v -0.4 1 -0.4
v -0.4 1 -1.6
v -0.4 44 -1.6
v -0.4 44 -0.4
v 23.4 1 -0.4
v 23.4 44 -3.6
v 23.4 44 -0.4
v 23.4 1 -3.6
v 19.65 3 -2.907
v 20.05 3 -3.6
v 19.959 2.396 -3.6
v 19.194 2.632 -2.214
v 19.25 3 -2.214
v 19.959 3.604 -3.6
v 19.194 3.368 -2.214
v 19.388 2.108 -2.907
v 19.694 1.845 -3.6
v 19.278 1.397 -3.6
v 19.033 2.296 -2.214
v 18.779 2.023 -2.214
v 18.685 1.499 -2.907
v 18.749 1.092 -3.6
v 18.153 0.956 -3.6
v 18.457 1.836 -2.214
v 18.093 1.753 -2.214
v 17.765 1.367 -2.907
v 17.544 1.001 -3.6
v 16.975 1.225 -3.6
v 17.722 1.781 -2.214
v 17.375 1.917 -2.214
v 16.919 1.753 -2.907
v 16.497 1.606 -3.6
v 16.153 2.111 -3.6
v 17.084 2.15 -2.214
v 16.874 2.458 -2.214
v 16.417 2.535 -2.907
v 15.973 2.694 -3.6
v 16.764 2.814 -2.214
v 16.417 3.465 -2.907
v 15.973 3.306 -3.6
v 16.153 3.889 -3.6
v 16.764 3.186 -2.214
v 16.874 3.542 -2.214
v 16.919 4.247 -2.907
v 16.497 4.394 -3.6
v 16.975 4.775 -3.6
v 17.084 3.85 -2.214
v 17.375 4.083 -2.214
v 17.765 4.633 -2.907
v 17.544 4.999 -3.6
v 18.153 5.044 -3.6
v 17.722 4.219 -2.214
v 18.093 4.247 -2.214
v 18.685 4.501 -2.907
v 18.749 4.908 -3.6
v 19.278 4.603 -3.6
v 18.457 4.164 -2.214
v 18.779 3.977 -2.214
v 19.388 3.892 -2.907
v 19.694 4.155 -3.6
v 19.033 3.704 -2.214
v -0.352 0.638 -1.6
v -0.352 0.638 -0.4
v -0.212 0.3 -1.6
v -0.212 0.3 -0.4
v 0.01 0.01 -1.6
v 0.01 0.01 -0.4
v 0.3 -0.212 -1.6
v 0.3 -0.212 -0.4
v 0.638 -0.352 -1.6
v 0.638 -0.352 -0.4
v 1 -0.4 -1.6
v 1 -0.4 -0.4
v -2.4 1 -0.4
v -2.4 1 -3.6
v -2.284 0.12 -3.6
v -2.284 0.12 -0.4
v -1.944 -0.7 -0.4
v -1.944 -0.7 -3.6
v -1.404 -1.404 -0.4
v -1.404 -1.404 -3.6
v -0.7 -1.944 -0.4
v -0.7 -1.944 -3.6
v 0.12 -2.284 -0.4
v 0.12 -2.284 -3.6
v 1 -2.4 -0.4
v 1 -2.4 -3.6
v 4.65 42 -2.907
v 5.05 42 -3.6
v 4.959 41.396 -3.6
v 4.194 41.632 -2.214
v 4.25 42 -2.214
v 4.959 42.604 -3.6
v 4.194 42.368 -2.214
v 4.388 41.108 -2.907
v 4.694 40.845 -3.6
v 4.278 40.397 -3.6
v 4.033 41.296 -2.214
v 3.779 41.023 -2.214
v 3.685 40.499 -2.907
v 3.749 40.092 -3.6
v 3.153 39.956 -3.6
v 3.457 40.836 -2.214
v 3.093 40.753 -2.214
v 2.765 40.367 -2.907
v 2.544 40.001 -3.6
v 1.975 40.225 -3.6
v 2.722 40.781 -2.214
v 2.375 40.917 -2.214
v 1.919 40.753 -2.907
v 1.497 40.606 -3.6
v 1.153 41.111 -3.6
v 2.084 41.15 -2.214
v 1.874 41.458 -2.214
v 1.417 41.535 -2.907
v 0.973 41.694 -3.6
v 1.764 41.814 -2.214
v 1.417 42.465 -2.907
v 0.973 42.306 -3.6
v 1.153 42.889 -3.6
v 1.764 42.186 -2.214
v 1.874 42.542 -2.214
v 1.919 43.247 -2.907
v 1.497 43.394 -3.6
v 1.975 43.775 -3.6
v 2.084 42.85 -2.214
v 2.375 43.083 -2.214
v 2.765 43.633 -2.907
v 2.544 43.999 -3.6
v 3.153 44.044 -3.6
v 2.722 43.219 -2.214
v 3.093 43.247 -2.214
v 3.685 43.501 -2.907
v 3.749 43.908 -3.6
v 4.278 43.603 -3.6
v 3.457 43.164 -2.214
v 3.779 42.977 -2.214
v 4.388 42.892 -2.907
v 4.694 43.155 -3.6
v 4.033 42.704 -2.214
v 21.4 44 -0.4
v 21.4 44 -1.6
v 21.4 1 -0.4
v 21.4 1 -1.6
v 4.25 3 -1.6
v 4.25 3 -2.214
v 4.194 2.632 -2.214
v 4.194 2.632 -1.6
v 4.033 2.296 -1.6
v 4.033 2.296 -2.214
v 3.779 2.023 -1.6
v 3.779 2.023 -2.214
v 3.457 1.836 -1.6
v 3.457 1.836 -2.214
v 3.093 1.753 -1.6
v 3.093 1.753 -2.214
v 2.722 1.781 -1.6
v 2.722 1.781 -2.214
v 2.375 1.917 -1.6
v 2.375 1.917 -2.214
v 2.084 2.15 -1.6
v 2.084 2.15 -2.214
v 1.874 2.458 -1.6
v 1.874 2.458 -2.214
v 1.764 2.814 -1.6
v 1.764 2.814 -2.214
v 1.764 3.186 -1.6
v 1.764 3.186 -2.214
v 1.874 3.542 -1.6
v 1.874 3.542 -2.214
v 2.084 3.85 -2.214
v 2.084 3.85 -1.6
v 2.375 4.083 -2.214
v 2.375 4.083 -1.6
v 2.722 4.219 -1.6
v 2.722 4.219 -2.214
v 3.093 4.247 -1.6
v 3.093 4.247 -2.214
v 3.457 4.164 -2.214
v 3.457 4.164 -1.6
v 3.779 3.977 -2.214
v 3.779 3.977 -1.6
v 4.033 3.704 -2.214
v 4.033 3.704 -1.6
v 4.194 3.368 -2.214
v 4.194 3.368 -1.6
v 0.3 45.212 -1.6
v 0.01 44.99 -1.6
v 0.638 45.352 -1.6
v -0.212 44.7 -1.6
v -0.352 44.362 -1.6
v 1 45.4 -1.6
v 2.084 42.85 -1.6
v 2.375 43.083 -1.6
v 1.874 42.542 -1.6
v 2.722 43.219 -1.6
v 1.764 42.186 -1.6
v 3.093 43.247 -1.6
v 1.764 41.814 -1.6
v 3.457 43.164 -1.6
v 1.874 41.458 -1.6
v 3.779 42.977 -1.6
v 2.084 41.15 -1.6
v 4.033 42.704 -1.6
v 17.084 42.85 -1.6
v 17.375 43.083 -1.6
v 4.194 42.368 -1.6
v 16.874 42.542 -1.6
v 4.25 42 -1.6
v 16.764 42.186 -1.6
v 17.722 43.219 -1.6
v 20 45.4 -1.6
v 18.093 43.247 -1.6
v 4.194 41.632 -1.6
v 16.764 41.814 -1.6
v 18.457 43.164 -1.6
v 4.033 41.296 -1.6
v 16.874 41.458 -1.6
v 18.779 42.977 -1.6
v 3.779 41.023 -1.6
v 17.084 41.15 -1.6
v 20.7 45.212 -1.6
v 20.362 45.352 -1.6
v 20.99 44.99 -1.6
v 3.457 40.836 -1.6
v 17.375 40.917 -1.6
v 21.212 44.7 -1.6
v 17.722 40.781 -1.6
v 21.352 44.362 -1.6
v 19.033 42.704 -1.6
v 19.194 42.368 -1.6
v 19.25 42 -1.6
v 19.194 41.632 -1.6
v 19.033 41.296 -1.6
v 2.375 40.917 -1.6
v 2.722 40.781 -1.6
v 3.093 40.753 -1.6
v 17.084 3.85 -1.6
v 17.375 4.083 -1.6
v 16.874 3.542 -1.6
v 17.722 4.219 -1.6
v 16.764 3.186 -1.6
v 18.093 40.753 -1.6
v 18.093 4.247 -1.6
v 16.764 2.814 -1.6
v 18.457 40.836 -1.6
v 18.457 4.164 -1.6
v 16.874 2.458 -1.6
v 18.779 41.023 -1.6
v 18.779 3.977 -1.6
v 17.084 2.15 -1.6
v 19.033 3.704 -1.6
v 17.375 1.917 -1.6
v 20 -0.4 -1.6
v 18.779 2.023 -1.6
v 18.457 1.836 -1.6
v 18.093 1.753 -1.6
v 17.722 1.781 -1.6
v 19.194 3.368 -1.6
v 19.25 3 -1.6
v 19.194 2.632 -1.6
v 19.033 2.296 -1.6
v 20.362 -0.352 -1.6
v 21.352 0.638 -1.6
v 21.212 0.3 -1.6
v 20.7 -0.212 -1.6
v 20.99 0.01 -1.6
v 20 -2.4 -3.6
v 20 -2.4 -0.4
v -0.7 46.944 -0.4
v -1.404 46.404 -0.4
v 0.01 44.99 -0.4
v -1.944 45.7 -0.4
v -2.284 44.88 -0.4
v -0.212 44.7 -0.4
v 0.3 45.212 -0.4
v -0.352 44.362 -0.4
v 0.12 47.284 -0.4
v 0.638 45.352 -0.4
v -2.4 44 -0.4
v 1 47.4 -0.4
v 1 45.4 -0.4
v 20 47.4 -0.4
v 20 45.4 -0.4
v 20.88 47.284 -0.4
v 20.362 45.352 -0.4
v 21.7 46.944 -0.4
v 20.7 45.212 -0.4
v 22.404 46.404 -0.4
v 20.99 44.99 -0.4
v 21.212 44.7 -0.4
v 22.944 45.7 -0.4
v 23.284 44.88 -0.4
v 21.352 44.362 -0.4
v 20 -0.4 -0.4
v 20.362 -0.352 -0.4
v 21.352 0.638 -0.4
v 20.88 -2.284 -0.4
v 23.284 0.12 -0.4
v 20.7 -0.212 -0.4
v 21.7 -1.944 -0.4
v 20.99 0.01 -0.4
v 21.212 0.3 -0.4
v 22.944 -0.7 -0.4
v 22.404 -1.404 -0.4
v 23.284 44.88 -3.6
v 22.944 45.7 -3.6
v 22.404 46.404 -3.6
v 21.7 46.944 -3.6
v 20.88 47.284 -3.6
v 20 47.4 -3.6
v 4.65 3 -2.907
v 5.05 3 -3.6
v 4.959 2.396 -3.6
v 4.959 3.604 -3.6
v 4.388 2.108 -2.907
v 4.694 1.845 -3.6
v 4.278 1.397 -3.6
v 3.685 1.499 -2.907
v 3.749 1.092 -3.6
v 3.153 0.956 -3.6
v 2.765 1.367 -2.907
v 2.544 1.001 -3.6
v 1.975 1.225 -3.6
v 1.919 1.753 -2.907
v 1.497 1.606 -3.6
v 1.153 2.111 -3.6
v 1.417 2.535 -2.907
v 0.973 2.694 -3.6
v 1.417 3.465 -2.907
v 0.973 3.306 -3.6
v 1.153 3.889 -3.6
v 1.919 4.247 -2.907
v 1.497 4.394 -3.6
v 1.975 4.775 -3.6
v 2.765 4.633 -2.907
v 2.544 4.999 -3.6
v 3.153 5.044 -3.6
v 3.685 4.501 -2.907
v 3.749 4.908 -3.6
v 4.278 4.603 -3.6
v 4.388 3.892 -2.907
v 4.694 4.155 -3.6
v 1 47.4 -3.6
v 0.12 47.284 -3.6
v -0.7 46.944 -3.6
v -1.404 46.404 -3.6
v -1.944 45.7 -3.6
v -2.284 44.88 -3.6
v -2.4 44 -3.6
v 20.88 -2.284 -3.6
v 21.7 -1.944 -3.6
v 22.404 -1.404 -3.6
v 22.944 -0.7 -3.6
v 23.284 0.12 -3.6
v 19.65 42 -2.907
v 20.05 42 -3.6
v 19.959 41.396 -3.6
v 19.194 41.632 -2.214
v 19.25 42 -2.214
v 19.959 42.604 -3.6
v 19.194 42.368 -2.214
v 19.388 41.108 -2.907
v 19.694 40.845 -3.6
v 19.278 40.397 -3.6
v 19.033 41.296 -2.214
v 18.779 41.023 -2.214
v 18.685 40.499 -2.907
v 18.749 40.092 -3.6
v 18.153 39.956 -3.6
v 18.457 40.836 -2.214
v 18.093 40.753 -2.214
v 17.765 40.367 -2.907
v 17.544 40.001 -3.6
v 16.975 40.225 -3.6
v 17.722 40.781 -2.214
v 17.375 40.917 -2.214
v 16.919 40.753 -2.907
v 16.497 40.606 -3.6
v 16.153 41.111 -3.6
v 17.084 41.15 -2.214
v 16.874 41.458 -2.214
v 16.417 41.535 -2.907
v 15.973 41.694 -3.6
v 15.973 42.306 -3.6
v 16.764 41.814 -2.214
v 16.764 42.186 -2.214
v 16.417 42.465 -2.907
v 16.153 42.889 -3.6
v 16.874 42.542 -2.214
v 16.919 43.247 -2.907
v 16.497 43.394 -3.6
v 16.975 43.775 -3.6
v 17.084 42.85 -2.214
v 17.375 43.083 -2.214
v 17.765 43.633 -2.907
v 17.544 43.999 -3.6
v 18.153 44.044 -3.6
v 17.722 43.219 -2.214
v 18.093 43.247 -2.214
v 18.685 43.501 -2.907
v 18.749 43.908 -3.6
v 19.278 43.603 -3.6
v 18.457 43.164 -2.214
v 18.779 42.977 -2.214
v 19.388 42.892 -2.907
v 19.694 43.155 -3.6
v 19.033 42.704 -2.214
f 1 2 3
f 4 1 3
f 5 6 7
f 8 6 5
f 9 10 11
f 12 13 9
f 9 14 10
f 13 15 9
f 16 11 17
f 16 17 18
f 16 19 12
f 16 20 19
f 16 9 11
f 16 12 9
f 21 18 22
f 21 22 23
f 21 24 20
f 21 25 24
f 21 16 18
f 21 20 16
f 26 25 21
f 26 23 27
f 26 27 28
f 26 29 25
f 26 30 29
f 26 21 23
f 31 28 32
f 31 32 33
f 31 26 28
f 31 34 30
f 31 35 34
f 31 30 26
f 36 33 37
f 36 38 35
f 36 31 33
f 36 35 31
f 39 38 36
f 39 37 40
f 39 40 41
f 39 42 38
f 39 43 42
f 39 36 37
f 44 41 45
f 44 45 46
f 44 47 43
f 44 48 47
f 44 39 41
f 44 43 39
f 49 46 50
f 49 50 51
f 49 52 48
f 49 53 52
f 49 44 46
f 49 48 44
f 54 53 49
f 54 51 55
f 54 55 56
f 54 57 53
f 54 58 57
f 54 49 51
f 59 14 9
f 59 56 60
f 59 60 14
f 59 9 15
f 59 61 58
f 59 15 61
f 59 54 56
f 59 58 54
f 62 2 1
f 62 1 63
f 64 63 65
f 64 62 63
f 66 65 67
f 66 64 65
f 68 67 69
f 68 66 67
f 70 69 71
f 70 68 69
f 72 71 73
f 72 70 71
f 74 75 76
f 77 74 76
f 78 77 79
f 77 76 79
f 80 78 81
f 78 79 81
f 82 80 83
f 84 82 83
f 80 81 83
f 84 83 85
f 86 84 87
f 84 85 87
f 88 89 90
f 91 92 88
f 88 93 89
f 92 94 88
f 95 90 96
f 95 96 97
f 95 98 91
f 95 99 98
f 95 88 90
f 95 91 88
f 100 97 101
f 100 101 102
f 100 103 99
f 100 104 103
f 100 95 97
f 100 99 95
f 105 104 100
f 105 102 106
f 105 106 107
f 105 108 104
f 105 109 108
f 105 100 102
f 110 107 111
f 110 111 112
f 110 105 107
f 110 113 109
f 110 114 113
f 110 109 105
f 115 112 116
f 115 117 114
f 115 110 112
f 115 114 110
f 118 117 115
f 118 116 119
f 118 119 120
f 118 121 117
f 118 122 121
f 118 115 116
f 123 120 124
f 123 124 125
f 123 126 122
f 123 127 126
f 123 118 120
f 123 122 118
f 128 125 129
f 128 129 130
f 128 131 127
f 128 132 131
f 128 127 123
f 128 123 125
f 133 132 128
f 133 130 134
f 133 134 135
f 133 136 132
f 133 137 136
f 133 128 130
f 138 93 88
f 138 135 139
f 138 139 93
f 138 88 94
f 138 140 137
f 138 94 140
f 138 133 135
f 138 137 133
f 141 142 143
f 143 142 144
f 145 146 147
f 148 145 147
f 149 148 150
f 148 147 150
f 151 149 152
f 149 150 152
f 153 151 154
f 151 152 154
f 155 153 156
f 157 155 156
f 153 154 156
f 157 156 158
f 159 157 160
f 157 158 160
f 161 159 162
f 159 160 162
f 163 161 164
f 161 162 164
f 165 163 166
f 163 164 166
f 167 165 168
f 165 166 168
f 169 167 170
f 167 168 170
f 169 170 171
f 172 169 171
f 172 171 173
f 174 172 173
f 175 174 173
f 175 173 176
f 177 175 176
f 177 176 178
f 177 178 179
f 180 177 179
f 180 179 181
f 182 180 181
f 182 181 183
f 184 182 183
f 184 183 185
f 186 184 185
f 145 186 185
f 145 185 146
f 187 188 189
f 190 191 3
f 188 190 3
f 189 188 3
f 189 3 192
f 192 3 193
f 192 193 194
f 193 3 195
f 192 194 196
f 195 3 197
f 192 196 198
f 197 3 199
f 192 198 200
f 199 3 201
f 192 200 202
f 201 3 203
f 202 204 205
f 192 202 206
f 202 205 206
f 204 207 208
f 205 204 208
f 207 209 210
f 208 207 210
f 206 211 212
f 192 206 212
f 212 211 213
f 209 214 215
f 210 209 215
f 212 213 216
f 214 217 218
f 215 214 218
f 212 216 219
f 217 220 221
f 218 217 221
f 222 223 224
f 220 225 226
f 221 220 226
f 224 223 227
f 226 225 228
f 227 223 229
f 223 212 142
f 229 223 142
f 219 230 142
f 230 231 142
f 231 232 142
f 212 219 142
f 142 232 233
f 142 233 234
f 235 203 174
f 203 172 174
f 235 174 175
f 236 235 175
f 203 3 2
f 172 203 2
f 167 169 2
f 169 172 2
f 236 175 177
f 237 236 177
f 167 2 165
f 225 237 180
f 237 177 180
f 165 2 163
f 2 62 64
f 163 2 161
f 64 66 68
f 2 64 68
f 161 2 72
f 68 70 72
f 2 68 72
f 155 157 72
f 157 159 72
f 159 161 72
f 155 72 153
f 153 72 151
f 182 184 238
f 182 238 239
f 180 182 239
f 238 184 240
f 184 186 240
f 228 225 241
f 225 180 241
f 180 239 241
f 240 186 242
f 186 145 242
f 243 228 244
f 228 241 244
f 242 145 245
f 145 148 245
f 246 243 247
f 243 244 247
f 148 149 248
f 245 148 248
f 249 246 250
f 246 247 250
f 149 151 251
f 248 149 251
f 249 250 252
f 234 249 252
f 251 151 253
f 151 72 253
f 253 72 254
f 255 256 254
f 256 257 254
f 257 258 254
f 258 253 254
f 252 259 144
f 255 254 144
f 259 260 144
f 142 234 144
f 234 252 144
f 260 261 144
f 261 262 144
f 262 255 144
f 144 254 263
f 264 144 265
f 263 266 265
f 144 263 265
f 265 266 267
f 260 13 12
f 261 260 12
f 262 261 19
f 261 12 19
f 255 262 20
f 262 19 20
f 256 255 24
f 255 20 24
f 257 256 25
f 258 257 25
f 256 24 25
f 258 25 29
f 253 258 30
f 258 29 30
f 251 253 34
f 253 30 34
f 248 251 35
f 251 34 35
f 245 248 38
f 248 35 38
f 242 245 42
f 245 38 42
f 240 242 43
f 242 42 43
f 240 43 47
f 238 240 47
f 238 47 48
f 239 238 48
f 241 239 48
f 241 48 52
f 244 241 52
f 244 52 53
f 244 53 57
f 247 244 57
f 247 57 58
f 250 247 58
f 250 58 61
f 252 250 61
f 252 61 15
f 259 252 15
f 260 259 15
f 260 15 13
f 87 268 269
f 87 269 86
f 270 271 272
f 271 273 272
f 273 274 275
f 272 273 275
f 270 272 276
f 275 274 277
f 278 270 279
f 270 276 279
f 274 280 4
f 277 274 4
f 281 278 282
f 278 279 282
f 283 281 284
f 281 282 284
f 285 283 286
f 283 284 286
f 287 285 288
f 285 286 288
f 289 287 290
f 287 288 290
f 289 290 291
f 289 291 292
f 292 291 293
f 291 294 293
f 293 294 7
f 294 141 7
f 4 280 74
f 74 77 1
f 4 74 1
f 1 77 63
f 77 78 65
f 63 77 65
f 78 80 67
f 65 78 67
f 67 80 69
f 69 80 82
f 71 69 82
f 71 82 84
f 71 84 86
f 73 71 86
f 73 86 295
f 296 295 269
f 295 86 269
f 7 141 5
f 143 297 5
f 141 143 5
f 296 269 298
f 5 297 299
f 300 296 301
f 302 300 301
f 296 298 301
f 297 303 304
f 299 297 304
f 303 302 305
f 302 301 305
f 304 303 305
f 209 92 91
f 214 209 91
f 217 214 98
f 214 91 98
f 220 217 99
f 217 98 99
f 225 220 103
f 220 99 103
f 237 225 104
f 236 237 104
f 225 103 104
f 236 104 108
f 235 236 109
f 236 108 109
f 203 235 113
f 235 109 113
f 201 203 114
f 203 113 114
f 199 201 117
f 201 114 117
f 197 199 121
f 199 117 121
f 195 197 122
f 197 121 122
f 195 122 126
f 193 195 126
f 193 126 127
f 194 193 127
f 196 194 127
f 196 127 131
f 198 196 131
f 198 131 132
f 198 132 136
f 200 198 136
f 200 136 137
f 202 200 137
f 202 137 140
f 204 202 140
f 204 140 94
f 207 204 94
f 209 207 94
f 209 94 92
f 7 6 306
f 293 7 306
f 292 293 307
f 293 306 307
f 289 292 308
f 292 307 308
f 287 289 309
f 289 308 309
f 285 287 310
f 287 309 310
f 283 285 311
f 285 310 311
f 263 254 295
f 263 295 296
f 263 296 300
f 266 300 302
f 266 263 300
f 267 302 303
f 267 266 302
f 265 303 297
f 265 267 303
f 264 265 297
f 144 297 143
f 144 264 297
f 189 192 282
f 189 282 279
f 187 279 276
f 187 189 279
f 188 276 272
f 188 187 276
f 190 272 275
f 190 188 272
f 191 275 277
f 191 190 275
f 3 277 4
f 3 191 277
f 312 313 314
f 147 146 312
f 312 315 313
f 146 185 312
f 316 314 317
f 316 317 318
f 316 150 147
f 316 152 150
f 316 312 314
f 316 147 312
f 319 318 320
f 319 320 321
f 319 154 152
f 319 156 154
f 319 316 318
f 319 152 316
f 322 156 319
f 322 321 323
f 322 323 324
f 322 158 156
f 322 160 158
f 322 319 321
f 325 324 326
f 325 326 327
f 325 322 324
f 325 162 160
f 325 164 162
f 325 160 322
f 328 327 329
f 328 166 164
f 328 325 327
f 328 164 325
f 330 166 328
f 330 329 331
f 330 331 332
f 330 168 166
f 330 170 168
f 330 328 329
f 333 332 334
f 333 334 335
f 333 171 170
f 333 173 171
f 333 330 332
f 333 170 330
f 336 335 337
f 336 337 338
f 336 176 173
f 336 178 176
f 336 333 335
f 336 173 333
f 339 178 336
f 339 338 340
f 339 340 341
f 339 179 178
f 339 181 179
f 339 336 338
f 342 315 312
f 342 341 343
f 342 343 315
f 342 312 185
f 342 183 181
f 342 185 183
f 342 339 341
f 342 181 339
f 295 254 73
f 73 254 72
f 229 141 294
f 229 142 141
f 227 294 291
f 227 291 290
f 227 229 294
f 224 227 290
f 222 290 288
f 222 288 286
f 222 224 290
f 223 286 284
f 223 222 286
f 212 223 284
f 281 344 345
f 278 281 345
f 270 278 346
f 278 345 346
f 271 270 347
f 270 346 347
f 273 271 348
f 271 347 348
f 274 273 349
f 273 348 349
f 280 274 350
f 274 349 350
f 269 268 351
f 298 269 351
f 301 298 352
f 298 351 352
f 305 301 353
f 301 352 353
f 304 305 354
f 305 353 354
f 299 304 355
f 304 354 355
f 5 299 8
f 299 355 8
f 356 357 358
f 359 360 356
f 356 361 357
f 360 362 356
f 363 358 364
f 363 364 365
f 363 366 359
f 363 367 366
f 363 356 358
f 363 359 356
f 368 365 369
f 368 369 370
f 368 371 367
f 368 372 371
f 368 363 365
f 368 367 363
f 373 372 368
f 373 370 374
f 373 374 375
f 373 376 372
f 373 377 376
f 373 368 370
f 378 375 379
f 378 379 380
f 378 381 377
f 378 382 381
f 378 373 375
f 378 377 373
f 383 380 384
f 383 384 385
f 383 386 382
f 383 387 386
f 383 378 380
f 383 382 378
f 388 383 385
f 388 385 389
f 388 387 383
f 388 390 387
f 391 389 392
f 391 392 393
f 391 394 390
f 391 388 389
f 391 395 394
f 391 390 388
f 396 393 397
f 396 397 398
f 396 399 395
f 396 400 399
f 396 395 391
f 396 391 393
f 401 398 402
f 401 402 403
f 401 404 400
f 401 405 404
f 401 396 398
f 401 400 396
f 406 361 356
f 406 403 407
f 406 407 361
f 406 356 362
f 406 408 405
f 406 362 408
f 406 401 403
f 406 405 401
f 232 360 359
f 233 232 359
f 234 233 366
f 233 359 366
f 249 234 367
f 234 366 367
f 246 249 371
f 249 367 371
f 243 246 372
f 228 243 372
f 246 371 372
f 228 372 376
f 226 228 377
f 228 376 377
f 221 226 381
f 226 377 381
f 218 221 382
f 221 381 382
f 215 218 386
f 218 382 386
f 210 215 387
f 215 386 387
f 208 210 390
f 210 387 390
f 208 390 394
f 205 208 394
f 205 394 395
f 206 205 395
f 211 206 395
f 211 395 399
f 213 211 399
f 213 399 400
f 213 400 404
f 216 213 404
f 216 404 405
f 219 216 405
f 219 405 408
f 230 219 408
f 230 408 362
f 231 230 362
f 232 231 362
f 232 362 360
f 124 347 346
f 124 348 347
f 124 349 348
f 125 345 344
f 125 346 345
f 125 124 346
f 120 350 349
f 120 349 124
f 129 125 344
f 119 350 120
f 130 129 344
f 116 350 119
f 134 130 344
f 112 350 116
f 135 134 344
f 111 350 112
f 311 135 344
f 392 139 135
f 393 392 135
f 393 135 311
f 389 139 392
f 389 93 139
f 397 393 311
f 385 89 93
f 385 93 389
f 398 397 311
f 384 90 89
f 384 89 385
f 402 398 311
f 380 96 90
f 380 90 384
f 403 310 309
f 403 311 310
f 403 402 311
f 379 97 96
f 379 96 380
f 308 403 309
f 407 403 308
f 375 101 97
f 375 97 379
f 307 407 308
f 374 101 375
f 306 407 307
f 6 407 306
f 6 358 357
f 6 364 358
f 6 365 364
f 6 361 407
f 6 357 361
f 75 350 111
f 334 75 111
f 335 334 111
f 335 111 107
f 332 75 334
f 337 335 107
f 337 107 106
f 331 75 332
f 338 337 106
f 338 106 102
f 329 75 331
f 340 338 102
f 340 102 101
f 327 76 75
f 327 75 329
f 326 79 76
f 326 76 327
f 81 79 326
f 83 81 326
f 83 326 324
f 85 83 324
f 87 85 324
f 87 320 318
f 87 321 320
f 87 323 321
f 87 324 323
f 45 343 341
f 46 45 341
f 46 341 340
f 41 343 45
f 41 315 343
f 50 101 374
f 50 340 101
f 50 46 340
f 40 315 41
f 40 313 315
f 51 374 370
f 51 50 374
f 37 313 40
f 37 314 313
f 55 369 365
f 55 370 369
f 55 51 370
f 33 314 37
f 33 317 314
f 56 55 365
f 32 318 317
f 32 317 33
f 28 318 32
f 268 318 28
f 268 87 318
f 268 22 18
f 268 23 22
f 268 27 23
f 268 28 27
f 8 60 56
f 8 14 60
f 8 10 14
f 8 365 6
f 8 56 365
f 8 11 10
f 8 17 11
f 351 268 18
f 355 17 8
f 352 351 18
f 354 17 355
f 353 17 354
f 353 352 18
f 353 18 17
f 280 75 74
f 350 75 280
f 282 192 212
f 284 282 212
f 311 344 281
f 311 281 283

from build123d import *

# Parameters (mm, degrees)
PAD_DEPTH        = 3.2
THICKNESS_T      = -2
SKETCH026_R      = 1.25
POCKET010_DEPTH  = 3.201
CHAMFER001_ANGLE = 60
CHAMFER001_SIZE  = 0.8


with BuildPart() as part:
    # Sketch025 → Pad (new body)
    with BuildSketch(Plane(origin=(0, 0, 0), x_dir=(-1, 0, 0), z_dir=(0, 0, 1))):
        with BuildLine():
            Line((-23.4, -44.000002), (-23.4, -0.999999))
            ThreePointArc((-20, 2.4), (-22.404163, 1.404164), (-23.4, -0.999999))
            Line((-20, 2.4), (-0.999999, 2.4))
            ThreePointArc((2.4, -1), (1.404164, 1.404163), (-0.999999, 2.4))
            Line((2.4, -1), (2.4, -44.000002))
            ThreePointArc((-0.999999, -47.4), (1.404163, -46.404164), (2.4, -44.000002))
            Line((-0.999999, -47.4), (-20.000001, -47.4))
            ThreePointArc((-23.4, -44.000002), (-22.404163, -46.404164), (-20.000001, -47.4))
        make_face()
    extrude(amount=PAD_DEPTH)

    # Thickness
    thickness_openings = [part.faces().sort_by_distance(p)[0] for p in [
        (10.5, 22.5, 3.2),
    ]]
    offset(amount=THICKNESS_T, openings=thickness_openings)

    # Sketch026 (on Face9 of Thickness) → Pocket010 (cut, through all)
    with BuildSketch(Plane(origin=(0, 0, 0), x_dir=(1, 0, 0), z_dir=(0, 0, -1))):
        with Locations((3, -3)):
            Circle(SKETCH026_R)
        with Locations((18, -3)):
            Circle(SKETCH026_R)
        with Locations((18, -42)):
            Circle(SKETCH026_R)
        with Locations((3, -42)):
            Circle(SKETCH026_R)
    extrude(amount=-POCKET010_DEPTH, mode=Mode.SUBTRACT)

    # Chamfer001
    chamfer001_edges = [part.edges().sort_by_distance(p)[0] for p in [
        (1.75, 42, 0),
        (16.75, 42, 0),
        (1.75, 3, 0),
        (16.75, 3, 0),
    ]]
    chamfer001_side = part.faces().sort_by_distance((10.5, 22.5, 0))[0]
    chamfer(chamfer001_edges, length=CHAMFER001_SIZE, angle=CHAMFER001_ANGLE, reference=chamfer001_side)


with BuildPart() as part_1:
    # Body010 placement: moved
    add(part.part.moved(Location((0, 0, -3.6))))


solid = part_1.part
